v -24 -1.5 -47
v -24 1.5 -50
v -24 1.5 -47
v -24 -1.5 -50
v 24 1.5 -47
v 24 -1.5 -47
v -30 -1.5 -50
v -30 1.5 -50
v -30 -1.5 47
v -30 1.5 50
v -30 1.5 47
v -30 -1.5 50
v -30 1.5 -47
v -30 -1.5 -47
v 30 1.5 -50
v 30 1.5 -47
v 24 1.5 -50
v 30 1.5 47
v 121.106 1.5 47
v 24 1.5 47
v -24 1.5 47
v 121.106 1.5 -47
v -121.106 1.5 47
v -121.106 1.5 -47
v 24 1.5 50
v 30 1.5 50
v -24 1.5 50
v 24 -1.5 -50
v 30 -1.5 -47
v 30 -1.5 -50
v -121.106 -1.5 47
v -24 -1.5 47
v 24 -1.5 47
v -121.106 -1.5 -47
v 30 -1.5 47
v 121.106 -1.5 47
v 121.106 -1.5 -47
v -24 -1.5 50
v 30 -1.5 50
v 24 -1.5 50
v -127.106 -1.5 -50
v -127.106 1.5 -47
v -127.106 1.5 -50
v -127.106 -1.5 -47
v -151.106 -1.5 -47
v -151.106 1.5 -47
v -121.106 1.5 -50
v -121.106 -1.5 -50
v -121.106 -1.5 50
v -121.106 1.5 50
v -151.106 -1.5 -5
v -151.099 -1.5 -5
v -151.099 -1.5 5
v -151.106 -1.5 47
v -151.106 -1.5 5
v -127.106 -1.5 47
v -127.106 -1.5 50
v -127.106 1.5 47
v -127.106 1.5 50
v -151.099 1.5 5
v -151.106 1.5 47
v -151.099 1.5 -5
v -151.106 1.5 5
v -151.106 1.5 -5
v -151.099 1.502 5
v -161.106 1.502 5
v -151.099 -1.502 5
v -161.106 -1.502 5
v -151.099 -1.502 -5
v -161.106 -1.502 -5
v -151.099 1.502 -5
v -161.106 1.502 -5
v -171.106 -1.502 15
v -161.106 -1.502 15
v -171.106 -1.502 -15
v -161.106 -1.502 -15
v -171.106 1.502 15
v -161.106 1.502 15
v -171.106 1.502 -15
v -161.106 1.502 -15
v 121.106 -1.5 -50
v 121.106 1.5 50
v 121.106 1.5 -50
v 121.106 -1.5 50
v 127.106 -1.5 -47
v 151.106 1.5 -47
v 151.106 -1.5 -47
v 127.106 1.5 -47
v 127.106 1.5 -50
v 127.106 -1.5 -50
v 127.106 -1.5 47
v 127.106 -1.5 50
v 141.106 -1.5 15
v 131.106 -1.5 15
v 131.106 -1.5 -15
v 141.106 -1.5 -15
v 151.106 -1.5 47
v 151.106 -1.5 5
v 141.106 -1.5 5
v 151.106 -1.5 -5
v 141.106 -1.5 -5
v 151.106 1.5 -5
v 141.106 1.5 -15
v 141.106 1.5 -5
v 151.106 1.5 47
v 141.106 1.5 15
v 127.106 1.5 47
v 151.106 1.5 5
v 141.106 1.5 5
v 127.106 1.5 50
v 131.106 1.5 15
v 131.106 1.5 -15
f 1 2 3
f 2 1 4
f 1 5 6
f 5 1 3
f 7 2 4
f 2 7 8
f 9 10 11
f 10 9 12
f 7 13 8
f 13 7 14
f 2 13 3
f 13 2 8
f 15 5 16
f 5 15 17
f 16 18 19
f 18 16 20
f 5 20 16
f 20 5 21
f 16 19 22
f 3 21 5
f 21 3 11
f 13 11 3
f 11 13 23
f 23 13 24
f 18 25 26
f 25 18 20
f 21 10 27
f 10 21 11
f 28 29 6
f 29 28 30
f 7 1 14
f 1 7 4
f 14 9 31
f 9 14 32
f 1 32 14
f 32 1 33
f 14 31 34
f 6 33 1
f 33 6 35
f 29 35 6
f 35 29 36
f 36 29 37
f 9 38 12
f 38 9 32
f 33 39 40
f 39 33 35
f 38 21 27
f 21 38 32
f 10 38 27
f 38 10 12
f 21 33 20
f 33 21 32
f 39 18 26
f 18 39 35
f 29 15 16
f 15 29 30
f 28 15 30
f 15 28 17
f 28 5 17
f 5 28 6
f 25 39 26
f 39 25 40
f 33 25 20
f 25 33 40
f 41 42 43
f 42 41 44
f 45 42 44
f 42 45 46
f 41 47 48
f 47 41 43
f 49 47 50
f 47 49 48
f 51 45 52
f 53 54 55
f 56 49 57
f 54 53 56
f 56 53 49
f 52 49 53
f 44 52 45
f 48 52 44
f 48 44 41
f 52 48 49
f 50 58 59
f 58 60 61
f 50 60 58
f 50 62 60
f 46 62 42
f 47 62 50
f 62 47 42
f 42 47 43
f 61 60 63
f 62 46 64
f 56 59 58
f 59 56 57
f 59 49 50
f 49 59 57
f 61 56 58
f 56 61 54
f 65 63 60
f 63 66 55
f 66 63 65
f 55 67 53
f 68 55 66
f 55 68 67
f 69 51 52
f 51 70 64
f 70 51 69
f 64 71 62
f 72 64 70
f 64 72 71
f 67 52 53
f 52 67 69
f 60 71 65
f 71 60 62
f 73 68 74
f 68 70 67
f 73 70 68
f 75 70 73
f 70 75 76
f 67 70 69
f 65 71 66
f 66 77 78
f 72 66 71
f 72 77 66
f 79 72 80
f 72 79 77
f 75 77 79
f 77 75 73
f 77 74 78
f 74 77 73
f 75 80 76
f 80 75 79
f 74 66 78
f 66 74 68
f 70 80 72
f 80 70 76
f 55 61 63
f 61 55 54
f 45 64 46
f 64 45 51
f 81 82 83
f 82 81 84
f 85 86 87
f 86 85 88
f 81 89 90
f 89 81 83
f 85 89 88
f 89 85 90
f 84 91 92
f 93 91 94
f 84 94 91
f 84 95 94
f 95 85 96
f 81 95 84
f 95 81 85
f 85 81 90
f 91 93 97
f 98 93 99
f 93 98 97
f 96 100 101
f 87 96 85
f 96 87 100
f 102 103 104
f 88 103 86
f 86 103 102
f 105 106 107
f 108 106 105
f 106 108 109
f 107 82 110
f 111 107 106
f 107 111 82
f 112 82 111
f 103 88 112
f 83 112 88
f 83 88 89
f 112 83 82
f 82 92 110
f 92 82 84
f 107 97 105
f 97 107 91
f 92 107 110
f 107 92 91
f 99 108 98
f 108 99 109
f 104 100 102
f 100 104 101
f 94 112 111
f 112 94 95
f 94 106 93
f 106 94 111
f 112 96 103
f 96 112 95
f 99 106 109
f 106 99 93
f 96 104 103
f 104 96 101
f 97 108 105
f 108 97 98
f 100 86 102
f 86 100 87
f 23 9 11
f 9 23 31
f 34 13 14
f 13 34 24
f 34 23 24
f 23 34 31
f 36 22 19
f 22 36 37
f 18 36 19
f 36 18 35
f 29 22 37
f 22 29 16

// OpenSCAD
// file: wall-anchor.scad
/**
 * The anchor is the structure
 * on the back side of the box
 * which holds together the
 * two ends of the wall.
 */

include <measures.scad>;

module wall_anchor()
{
    // horizontal
    translate([
        anchor_length/2-nothing,
        0,
        0
        ])
    cube([
        anchor_length+nothing,
        material_z+nothing,
        anchor_width
        ], center=true);

    // vertical
    translate([
        +anchor_length-anchor_width/2,
        0,
        0
        ])
    cube([
        anchor_width,
        material_z+nothing,
        anchor_height
        ], center=true);
}

wall_anchor();
// file: wall-back-female.scad
include <measures.scad>;
use <wall-front.scad>;
use <wall-anchor.scad>;

module wall_nose()
{
    cube([
        nose_width,
        material_z,
        material_z
        ], center=true);
}

module wall_back_female()
{
    difference()
    {
        // base material
        translate([
            +rect_x/4,
            0,
            0
            ])
        cube([
            rect_x/2,
            material_z,
            wall_z
            ], center=true);

        wall_anchor();
    }

    // noses to top and bottom
    wall_noses_right();
}

wall_back_female();
// file: wall-back-male.scad
include <measures.scad>;
use <wall-front.scad>;
use <wall-anchor.scad>;

module wall_back_male()
{
    // base material
    translate([
        -rect_x/4,
        0,
        0
        ])
    cube([
        rect_x/2,
        material_z,
        wall_z
        ], center=true);

    // noses to top and bottom
    wall_noses_left();

    // anchor
    wall_anchor(anchor_width);
}

wall_back_male();
// file: wall-front.scad
include <measures.scad>;

module wall_noses(x)
{
    for (z=[
        -wall_z/2-nose_z/2,
        +wall_z/2+nose_z/2
        ])
    {
        translate([
            x,
            0,
            z
            ])
        cube([
            nose_x,
            material_z,
            nose_z
            ], center=true);
    }
}

module wall_noses_left()
{
    wall_noses(-rect_x/2+nose_x/2);
}

module wall_noses_right()
{
    wall_noses(+rect_x/2-nose_x/2);
}

module wall_front()
{
    // base material
    cube([
        rect_x,
        material_z,
        wall_z
        ], center=true);

    // noses to top and bottom
    wall_noses_left();
    wall_noses_right();
}

wall_front();
// file: measures.scad
/**
 * Pencil box configuration
 * All measures in millimeters
 */

// rendering parameters
$fn = 200;
nothing = 0.005;

// material to cut from
material_x = 350;
material_y = 180;
material_z = 3;

// total size of the box
box_x = 130;
box_y = 70;
box_z = 100;

// measures of the two half circles left and right
curvature_y = box_y;
curvature_x = curvature_y/2;

// measure of rectangle between half circles
rect_x = box_x - 2*curvature_x;
rect_y = box_y;

top_opening_inset = 5.7*material_z;

wall_z = box_z - 2*material_z;

// distance between wall and outer edge
wall_inset = material_z;

curve_radius = box_y/2 - wall_inset - material_z;
curve_length = curve_radius*PI;

// total wall length without anchor
wall_length = 2*rect_x + 2*curve_length;

// nose properties
nose_x = 2*material_z;
nose_z = material_z;

// anchor
anchor_width = 10;
anchor_height = 30;
anchor_length = 20;

// for preview
pillar_count = 20;
pillar_angle = 180 / (pillar_count-1);
pillar_width = 4;

part_spacing = 1;
// main file
include <measures.scad>;
use <wall-front.scad>;
use <wall-back-male.scad>;
use <wall-back-female.scad>;

module wall_curved_area()
{
    cube([
        curve_length,
        material_z,
        wall_z
        ], center=true);
}

module wall()
{
    wall_front();

    // flattened curve left
    translate([
        -rect_x/2-curve_length/2,
        0,
        0
        ])
    wall_curved_area();

    // flattened curve right
    translate([
        +rect_x/2+curve_length/2,
        0,
        0
        ])
    wall_curved_area();

    // male anchor end
    translate([
        -rect_x-curve_length,
        0,
        0
        ])
    rotate(180)
    wall_back_male();

    // female anchor end
    translate([
        +rect_x+curve_length,
        0,
        0
        ])
    rotate(180)
    wall_back_female();
}

wall();
